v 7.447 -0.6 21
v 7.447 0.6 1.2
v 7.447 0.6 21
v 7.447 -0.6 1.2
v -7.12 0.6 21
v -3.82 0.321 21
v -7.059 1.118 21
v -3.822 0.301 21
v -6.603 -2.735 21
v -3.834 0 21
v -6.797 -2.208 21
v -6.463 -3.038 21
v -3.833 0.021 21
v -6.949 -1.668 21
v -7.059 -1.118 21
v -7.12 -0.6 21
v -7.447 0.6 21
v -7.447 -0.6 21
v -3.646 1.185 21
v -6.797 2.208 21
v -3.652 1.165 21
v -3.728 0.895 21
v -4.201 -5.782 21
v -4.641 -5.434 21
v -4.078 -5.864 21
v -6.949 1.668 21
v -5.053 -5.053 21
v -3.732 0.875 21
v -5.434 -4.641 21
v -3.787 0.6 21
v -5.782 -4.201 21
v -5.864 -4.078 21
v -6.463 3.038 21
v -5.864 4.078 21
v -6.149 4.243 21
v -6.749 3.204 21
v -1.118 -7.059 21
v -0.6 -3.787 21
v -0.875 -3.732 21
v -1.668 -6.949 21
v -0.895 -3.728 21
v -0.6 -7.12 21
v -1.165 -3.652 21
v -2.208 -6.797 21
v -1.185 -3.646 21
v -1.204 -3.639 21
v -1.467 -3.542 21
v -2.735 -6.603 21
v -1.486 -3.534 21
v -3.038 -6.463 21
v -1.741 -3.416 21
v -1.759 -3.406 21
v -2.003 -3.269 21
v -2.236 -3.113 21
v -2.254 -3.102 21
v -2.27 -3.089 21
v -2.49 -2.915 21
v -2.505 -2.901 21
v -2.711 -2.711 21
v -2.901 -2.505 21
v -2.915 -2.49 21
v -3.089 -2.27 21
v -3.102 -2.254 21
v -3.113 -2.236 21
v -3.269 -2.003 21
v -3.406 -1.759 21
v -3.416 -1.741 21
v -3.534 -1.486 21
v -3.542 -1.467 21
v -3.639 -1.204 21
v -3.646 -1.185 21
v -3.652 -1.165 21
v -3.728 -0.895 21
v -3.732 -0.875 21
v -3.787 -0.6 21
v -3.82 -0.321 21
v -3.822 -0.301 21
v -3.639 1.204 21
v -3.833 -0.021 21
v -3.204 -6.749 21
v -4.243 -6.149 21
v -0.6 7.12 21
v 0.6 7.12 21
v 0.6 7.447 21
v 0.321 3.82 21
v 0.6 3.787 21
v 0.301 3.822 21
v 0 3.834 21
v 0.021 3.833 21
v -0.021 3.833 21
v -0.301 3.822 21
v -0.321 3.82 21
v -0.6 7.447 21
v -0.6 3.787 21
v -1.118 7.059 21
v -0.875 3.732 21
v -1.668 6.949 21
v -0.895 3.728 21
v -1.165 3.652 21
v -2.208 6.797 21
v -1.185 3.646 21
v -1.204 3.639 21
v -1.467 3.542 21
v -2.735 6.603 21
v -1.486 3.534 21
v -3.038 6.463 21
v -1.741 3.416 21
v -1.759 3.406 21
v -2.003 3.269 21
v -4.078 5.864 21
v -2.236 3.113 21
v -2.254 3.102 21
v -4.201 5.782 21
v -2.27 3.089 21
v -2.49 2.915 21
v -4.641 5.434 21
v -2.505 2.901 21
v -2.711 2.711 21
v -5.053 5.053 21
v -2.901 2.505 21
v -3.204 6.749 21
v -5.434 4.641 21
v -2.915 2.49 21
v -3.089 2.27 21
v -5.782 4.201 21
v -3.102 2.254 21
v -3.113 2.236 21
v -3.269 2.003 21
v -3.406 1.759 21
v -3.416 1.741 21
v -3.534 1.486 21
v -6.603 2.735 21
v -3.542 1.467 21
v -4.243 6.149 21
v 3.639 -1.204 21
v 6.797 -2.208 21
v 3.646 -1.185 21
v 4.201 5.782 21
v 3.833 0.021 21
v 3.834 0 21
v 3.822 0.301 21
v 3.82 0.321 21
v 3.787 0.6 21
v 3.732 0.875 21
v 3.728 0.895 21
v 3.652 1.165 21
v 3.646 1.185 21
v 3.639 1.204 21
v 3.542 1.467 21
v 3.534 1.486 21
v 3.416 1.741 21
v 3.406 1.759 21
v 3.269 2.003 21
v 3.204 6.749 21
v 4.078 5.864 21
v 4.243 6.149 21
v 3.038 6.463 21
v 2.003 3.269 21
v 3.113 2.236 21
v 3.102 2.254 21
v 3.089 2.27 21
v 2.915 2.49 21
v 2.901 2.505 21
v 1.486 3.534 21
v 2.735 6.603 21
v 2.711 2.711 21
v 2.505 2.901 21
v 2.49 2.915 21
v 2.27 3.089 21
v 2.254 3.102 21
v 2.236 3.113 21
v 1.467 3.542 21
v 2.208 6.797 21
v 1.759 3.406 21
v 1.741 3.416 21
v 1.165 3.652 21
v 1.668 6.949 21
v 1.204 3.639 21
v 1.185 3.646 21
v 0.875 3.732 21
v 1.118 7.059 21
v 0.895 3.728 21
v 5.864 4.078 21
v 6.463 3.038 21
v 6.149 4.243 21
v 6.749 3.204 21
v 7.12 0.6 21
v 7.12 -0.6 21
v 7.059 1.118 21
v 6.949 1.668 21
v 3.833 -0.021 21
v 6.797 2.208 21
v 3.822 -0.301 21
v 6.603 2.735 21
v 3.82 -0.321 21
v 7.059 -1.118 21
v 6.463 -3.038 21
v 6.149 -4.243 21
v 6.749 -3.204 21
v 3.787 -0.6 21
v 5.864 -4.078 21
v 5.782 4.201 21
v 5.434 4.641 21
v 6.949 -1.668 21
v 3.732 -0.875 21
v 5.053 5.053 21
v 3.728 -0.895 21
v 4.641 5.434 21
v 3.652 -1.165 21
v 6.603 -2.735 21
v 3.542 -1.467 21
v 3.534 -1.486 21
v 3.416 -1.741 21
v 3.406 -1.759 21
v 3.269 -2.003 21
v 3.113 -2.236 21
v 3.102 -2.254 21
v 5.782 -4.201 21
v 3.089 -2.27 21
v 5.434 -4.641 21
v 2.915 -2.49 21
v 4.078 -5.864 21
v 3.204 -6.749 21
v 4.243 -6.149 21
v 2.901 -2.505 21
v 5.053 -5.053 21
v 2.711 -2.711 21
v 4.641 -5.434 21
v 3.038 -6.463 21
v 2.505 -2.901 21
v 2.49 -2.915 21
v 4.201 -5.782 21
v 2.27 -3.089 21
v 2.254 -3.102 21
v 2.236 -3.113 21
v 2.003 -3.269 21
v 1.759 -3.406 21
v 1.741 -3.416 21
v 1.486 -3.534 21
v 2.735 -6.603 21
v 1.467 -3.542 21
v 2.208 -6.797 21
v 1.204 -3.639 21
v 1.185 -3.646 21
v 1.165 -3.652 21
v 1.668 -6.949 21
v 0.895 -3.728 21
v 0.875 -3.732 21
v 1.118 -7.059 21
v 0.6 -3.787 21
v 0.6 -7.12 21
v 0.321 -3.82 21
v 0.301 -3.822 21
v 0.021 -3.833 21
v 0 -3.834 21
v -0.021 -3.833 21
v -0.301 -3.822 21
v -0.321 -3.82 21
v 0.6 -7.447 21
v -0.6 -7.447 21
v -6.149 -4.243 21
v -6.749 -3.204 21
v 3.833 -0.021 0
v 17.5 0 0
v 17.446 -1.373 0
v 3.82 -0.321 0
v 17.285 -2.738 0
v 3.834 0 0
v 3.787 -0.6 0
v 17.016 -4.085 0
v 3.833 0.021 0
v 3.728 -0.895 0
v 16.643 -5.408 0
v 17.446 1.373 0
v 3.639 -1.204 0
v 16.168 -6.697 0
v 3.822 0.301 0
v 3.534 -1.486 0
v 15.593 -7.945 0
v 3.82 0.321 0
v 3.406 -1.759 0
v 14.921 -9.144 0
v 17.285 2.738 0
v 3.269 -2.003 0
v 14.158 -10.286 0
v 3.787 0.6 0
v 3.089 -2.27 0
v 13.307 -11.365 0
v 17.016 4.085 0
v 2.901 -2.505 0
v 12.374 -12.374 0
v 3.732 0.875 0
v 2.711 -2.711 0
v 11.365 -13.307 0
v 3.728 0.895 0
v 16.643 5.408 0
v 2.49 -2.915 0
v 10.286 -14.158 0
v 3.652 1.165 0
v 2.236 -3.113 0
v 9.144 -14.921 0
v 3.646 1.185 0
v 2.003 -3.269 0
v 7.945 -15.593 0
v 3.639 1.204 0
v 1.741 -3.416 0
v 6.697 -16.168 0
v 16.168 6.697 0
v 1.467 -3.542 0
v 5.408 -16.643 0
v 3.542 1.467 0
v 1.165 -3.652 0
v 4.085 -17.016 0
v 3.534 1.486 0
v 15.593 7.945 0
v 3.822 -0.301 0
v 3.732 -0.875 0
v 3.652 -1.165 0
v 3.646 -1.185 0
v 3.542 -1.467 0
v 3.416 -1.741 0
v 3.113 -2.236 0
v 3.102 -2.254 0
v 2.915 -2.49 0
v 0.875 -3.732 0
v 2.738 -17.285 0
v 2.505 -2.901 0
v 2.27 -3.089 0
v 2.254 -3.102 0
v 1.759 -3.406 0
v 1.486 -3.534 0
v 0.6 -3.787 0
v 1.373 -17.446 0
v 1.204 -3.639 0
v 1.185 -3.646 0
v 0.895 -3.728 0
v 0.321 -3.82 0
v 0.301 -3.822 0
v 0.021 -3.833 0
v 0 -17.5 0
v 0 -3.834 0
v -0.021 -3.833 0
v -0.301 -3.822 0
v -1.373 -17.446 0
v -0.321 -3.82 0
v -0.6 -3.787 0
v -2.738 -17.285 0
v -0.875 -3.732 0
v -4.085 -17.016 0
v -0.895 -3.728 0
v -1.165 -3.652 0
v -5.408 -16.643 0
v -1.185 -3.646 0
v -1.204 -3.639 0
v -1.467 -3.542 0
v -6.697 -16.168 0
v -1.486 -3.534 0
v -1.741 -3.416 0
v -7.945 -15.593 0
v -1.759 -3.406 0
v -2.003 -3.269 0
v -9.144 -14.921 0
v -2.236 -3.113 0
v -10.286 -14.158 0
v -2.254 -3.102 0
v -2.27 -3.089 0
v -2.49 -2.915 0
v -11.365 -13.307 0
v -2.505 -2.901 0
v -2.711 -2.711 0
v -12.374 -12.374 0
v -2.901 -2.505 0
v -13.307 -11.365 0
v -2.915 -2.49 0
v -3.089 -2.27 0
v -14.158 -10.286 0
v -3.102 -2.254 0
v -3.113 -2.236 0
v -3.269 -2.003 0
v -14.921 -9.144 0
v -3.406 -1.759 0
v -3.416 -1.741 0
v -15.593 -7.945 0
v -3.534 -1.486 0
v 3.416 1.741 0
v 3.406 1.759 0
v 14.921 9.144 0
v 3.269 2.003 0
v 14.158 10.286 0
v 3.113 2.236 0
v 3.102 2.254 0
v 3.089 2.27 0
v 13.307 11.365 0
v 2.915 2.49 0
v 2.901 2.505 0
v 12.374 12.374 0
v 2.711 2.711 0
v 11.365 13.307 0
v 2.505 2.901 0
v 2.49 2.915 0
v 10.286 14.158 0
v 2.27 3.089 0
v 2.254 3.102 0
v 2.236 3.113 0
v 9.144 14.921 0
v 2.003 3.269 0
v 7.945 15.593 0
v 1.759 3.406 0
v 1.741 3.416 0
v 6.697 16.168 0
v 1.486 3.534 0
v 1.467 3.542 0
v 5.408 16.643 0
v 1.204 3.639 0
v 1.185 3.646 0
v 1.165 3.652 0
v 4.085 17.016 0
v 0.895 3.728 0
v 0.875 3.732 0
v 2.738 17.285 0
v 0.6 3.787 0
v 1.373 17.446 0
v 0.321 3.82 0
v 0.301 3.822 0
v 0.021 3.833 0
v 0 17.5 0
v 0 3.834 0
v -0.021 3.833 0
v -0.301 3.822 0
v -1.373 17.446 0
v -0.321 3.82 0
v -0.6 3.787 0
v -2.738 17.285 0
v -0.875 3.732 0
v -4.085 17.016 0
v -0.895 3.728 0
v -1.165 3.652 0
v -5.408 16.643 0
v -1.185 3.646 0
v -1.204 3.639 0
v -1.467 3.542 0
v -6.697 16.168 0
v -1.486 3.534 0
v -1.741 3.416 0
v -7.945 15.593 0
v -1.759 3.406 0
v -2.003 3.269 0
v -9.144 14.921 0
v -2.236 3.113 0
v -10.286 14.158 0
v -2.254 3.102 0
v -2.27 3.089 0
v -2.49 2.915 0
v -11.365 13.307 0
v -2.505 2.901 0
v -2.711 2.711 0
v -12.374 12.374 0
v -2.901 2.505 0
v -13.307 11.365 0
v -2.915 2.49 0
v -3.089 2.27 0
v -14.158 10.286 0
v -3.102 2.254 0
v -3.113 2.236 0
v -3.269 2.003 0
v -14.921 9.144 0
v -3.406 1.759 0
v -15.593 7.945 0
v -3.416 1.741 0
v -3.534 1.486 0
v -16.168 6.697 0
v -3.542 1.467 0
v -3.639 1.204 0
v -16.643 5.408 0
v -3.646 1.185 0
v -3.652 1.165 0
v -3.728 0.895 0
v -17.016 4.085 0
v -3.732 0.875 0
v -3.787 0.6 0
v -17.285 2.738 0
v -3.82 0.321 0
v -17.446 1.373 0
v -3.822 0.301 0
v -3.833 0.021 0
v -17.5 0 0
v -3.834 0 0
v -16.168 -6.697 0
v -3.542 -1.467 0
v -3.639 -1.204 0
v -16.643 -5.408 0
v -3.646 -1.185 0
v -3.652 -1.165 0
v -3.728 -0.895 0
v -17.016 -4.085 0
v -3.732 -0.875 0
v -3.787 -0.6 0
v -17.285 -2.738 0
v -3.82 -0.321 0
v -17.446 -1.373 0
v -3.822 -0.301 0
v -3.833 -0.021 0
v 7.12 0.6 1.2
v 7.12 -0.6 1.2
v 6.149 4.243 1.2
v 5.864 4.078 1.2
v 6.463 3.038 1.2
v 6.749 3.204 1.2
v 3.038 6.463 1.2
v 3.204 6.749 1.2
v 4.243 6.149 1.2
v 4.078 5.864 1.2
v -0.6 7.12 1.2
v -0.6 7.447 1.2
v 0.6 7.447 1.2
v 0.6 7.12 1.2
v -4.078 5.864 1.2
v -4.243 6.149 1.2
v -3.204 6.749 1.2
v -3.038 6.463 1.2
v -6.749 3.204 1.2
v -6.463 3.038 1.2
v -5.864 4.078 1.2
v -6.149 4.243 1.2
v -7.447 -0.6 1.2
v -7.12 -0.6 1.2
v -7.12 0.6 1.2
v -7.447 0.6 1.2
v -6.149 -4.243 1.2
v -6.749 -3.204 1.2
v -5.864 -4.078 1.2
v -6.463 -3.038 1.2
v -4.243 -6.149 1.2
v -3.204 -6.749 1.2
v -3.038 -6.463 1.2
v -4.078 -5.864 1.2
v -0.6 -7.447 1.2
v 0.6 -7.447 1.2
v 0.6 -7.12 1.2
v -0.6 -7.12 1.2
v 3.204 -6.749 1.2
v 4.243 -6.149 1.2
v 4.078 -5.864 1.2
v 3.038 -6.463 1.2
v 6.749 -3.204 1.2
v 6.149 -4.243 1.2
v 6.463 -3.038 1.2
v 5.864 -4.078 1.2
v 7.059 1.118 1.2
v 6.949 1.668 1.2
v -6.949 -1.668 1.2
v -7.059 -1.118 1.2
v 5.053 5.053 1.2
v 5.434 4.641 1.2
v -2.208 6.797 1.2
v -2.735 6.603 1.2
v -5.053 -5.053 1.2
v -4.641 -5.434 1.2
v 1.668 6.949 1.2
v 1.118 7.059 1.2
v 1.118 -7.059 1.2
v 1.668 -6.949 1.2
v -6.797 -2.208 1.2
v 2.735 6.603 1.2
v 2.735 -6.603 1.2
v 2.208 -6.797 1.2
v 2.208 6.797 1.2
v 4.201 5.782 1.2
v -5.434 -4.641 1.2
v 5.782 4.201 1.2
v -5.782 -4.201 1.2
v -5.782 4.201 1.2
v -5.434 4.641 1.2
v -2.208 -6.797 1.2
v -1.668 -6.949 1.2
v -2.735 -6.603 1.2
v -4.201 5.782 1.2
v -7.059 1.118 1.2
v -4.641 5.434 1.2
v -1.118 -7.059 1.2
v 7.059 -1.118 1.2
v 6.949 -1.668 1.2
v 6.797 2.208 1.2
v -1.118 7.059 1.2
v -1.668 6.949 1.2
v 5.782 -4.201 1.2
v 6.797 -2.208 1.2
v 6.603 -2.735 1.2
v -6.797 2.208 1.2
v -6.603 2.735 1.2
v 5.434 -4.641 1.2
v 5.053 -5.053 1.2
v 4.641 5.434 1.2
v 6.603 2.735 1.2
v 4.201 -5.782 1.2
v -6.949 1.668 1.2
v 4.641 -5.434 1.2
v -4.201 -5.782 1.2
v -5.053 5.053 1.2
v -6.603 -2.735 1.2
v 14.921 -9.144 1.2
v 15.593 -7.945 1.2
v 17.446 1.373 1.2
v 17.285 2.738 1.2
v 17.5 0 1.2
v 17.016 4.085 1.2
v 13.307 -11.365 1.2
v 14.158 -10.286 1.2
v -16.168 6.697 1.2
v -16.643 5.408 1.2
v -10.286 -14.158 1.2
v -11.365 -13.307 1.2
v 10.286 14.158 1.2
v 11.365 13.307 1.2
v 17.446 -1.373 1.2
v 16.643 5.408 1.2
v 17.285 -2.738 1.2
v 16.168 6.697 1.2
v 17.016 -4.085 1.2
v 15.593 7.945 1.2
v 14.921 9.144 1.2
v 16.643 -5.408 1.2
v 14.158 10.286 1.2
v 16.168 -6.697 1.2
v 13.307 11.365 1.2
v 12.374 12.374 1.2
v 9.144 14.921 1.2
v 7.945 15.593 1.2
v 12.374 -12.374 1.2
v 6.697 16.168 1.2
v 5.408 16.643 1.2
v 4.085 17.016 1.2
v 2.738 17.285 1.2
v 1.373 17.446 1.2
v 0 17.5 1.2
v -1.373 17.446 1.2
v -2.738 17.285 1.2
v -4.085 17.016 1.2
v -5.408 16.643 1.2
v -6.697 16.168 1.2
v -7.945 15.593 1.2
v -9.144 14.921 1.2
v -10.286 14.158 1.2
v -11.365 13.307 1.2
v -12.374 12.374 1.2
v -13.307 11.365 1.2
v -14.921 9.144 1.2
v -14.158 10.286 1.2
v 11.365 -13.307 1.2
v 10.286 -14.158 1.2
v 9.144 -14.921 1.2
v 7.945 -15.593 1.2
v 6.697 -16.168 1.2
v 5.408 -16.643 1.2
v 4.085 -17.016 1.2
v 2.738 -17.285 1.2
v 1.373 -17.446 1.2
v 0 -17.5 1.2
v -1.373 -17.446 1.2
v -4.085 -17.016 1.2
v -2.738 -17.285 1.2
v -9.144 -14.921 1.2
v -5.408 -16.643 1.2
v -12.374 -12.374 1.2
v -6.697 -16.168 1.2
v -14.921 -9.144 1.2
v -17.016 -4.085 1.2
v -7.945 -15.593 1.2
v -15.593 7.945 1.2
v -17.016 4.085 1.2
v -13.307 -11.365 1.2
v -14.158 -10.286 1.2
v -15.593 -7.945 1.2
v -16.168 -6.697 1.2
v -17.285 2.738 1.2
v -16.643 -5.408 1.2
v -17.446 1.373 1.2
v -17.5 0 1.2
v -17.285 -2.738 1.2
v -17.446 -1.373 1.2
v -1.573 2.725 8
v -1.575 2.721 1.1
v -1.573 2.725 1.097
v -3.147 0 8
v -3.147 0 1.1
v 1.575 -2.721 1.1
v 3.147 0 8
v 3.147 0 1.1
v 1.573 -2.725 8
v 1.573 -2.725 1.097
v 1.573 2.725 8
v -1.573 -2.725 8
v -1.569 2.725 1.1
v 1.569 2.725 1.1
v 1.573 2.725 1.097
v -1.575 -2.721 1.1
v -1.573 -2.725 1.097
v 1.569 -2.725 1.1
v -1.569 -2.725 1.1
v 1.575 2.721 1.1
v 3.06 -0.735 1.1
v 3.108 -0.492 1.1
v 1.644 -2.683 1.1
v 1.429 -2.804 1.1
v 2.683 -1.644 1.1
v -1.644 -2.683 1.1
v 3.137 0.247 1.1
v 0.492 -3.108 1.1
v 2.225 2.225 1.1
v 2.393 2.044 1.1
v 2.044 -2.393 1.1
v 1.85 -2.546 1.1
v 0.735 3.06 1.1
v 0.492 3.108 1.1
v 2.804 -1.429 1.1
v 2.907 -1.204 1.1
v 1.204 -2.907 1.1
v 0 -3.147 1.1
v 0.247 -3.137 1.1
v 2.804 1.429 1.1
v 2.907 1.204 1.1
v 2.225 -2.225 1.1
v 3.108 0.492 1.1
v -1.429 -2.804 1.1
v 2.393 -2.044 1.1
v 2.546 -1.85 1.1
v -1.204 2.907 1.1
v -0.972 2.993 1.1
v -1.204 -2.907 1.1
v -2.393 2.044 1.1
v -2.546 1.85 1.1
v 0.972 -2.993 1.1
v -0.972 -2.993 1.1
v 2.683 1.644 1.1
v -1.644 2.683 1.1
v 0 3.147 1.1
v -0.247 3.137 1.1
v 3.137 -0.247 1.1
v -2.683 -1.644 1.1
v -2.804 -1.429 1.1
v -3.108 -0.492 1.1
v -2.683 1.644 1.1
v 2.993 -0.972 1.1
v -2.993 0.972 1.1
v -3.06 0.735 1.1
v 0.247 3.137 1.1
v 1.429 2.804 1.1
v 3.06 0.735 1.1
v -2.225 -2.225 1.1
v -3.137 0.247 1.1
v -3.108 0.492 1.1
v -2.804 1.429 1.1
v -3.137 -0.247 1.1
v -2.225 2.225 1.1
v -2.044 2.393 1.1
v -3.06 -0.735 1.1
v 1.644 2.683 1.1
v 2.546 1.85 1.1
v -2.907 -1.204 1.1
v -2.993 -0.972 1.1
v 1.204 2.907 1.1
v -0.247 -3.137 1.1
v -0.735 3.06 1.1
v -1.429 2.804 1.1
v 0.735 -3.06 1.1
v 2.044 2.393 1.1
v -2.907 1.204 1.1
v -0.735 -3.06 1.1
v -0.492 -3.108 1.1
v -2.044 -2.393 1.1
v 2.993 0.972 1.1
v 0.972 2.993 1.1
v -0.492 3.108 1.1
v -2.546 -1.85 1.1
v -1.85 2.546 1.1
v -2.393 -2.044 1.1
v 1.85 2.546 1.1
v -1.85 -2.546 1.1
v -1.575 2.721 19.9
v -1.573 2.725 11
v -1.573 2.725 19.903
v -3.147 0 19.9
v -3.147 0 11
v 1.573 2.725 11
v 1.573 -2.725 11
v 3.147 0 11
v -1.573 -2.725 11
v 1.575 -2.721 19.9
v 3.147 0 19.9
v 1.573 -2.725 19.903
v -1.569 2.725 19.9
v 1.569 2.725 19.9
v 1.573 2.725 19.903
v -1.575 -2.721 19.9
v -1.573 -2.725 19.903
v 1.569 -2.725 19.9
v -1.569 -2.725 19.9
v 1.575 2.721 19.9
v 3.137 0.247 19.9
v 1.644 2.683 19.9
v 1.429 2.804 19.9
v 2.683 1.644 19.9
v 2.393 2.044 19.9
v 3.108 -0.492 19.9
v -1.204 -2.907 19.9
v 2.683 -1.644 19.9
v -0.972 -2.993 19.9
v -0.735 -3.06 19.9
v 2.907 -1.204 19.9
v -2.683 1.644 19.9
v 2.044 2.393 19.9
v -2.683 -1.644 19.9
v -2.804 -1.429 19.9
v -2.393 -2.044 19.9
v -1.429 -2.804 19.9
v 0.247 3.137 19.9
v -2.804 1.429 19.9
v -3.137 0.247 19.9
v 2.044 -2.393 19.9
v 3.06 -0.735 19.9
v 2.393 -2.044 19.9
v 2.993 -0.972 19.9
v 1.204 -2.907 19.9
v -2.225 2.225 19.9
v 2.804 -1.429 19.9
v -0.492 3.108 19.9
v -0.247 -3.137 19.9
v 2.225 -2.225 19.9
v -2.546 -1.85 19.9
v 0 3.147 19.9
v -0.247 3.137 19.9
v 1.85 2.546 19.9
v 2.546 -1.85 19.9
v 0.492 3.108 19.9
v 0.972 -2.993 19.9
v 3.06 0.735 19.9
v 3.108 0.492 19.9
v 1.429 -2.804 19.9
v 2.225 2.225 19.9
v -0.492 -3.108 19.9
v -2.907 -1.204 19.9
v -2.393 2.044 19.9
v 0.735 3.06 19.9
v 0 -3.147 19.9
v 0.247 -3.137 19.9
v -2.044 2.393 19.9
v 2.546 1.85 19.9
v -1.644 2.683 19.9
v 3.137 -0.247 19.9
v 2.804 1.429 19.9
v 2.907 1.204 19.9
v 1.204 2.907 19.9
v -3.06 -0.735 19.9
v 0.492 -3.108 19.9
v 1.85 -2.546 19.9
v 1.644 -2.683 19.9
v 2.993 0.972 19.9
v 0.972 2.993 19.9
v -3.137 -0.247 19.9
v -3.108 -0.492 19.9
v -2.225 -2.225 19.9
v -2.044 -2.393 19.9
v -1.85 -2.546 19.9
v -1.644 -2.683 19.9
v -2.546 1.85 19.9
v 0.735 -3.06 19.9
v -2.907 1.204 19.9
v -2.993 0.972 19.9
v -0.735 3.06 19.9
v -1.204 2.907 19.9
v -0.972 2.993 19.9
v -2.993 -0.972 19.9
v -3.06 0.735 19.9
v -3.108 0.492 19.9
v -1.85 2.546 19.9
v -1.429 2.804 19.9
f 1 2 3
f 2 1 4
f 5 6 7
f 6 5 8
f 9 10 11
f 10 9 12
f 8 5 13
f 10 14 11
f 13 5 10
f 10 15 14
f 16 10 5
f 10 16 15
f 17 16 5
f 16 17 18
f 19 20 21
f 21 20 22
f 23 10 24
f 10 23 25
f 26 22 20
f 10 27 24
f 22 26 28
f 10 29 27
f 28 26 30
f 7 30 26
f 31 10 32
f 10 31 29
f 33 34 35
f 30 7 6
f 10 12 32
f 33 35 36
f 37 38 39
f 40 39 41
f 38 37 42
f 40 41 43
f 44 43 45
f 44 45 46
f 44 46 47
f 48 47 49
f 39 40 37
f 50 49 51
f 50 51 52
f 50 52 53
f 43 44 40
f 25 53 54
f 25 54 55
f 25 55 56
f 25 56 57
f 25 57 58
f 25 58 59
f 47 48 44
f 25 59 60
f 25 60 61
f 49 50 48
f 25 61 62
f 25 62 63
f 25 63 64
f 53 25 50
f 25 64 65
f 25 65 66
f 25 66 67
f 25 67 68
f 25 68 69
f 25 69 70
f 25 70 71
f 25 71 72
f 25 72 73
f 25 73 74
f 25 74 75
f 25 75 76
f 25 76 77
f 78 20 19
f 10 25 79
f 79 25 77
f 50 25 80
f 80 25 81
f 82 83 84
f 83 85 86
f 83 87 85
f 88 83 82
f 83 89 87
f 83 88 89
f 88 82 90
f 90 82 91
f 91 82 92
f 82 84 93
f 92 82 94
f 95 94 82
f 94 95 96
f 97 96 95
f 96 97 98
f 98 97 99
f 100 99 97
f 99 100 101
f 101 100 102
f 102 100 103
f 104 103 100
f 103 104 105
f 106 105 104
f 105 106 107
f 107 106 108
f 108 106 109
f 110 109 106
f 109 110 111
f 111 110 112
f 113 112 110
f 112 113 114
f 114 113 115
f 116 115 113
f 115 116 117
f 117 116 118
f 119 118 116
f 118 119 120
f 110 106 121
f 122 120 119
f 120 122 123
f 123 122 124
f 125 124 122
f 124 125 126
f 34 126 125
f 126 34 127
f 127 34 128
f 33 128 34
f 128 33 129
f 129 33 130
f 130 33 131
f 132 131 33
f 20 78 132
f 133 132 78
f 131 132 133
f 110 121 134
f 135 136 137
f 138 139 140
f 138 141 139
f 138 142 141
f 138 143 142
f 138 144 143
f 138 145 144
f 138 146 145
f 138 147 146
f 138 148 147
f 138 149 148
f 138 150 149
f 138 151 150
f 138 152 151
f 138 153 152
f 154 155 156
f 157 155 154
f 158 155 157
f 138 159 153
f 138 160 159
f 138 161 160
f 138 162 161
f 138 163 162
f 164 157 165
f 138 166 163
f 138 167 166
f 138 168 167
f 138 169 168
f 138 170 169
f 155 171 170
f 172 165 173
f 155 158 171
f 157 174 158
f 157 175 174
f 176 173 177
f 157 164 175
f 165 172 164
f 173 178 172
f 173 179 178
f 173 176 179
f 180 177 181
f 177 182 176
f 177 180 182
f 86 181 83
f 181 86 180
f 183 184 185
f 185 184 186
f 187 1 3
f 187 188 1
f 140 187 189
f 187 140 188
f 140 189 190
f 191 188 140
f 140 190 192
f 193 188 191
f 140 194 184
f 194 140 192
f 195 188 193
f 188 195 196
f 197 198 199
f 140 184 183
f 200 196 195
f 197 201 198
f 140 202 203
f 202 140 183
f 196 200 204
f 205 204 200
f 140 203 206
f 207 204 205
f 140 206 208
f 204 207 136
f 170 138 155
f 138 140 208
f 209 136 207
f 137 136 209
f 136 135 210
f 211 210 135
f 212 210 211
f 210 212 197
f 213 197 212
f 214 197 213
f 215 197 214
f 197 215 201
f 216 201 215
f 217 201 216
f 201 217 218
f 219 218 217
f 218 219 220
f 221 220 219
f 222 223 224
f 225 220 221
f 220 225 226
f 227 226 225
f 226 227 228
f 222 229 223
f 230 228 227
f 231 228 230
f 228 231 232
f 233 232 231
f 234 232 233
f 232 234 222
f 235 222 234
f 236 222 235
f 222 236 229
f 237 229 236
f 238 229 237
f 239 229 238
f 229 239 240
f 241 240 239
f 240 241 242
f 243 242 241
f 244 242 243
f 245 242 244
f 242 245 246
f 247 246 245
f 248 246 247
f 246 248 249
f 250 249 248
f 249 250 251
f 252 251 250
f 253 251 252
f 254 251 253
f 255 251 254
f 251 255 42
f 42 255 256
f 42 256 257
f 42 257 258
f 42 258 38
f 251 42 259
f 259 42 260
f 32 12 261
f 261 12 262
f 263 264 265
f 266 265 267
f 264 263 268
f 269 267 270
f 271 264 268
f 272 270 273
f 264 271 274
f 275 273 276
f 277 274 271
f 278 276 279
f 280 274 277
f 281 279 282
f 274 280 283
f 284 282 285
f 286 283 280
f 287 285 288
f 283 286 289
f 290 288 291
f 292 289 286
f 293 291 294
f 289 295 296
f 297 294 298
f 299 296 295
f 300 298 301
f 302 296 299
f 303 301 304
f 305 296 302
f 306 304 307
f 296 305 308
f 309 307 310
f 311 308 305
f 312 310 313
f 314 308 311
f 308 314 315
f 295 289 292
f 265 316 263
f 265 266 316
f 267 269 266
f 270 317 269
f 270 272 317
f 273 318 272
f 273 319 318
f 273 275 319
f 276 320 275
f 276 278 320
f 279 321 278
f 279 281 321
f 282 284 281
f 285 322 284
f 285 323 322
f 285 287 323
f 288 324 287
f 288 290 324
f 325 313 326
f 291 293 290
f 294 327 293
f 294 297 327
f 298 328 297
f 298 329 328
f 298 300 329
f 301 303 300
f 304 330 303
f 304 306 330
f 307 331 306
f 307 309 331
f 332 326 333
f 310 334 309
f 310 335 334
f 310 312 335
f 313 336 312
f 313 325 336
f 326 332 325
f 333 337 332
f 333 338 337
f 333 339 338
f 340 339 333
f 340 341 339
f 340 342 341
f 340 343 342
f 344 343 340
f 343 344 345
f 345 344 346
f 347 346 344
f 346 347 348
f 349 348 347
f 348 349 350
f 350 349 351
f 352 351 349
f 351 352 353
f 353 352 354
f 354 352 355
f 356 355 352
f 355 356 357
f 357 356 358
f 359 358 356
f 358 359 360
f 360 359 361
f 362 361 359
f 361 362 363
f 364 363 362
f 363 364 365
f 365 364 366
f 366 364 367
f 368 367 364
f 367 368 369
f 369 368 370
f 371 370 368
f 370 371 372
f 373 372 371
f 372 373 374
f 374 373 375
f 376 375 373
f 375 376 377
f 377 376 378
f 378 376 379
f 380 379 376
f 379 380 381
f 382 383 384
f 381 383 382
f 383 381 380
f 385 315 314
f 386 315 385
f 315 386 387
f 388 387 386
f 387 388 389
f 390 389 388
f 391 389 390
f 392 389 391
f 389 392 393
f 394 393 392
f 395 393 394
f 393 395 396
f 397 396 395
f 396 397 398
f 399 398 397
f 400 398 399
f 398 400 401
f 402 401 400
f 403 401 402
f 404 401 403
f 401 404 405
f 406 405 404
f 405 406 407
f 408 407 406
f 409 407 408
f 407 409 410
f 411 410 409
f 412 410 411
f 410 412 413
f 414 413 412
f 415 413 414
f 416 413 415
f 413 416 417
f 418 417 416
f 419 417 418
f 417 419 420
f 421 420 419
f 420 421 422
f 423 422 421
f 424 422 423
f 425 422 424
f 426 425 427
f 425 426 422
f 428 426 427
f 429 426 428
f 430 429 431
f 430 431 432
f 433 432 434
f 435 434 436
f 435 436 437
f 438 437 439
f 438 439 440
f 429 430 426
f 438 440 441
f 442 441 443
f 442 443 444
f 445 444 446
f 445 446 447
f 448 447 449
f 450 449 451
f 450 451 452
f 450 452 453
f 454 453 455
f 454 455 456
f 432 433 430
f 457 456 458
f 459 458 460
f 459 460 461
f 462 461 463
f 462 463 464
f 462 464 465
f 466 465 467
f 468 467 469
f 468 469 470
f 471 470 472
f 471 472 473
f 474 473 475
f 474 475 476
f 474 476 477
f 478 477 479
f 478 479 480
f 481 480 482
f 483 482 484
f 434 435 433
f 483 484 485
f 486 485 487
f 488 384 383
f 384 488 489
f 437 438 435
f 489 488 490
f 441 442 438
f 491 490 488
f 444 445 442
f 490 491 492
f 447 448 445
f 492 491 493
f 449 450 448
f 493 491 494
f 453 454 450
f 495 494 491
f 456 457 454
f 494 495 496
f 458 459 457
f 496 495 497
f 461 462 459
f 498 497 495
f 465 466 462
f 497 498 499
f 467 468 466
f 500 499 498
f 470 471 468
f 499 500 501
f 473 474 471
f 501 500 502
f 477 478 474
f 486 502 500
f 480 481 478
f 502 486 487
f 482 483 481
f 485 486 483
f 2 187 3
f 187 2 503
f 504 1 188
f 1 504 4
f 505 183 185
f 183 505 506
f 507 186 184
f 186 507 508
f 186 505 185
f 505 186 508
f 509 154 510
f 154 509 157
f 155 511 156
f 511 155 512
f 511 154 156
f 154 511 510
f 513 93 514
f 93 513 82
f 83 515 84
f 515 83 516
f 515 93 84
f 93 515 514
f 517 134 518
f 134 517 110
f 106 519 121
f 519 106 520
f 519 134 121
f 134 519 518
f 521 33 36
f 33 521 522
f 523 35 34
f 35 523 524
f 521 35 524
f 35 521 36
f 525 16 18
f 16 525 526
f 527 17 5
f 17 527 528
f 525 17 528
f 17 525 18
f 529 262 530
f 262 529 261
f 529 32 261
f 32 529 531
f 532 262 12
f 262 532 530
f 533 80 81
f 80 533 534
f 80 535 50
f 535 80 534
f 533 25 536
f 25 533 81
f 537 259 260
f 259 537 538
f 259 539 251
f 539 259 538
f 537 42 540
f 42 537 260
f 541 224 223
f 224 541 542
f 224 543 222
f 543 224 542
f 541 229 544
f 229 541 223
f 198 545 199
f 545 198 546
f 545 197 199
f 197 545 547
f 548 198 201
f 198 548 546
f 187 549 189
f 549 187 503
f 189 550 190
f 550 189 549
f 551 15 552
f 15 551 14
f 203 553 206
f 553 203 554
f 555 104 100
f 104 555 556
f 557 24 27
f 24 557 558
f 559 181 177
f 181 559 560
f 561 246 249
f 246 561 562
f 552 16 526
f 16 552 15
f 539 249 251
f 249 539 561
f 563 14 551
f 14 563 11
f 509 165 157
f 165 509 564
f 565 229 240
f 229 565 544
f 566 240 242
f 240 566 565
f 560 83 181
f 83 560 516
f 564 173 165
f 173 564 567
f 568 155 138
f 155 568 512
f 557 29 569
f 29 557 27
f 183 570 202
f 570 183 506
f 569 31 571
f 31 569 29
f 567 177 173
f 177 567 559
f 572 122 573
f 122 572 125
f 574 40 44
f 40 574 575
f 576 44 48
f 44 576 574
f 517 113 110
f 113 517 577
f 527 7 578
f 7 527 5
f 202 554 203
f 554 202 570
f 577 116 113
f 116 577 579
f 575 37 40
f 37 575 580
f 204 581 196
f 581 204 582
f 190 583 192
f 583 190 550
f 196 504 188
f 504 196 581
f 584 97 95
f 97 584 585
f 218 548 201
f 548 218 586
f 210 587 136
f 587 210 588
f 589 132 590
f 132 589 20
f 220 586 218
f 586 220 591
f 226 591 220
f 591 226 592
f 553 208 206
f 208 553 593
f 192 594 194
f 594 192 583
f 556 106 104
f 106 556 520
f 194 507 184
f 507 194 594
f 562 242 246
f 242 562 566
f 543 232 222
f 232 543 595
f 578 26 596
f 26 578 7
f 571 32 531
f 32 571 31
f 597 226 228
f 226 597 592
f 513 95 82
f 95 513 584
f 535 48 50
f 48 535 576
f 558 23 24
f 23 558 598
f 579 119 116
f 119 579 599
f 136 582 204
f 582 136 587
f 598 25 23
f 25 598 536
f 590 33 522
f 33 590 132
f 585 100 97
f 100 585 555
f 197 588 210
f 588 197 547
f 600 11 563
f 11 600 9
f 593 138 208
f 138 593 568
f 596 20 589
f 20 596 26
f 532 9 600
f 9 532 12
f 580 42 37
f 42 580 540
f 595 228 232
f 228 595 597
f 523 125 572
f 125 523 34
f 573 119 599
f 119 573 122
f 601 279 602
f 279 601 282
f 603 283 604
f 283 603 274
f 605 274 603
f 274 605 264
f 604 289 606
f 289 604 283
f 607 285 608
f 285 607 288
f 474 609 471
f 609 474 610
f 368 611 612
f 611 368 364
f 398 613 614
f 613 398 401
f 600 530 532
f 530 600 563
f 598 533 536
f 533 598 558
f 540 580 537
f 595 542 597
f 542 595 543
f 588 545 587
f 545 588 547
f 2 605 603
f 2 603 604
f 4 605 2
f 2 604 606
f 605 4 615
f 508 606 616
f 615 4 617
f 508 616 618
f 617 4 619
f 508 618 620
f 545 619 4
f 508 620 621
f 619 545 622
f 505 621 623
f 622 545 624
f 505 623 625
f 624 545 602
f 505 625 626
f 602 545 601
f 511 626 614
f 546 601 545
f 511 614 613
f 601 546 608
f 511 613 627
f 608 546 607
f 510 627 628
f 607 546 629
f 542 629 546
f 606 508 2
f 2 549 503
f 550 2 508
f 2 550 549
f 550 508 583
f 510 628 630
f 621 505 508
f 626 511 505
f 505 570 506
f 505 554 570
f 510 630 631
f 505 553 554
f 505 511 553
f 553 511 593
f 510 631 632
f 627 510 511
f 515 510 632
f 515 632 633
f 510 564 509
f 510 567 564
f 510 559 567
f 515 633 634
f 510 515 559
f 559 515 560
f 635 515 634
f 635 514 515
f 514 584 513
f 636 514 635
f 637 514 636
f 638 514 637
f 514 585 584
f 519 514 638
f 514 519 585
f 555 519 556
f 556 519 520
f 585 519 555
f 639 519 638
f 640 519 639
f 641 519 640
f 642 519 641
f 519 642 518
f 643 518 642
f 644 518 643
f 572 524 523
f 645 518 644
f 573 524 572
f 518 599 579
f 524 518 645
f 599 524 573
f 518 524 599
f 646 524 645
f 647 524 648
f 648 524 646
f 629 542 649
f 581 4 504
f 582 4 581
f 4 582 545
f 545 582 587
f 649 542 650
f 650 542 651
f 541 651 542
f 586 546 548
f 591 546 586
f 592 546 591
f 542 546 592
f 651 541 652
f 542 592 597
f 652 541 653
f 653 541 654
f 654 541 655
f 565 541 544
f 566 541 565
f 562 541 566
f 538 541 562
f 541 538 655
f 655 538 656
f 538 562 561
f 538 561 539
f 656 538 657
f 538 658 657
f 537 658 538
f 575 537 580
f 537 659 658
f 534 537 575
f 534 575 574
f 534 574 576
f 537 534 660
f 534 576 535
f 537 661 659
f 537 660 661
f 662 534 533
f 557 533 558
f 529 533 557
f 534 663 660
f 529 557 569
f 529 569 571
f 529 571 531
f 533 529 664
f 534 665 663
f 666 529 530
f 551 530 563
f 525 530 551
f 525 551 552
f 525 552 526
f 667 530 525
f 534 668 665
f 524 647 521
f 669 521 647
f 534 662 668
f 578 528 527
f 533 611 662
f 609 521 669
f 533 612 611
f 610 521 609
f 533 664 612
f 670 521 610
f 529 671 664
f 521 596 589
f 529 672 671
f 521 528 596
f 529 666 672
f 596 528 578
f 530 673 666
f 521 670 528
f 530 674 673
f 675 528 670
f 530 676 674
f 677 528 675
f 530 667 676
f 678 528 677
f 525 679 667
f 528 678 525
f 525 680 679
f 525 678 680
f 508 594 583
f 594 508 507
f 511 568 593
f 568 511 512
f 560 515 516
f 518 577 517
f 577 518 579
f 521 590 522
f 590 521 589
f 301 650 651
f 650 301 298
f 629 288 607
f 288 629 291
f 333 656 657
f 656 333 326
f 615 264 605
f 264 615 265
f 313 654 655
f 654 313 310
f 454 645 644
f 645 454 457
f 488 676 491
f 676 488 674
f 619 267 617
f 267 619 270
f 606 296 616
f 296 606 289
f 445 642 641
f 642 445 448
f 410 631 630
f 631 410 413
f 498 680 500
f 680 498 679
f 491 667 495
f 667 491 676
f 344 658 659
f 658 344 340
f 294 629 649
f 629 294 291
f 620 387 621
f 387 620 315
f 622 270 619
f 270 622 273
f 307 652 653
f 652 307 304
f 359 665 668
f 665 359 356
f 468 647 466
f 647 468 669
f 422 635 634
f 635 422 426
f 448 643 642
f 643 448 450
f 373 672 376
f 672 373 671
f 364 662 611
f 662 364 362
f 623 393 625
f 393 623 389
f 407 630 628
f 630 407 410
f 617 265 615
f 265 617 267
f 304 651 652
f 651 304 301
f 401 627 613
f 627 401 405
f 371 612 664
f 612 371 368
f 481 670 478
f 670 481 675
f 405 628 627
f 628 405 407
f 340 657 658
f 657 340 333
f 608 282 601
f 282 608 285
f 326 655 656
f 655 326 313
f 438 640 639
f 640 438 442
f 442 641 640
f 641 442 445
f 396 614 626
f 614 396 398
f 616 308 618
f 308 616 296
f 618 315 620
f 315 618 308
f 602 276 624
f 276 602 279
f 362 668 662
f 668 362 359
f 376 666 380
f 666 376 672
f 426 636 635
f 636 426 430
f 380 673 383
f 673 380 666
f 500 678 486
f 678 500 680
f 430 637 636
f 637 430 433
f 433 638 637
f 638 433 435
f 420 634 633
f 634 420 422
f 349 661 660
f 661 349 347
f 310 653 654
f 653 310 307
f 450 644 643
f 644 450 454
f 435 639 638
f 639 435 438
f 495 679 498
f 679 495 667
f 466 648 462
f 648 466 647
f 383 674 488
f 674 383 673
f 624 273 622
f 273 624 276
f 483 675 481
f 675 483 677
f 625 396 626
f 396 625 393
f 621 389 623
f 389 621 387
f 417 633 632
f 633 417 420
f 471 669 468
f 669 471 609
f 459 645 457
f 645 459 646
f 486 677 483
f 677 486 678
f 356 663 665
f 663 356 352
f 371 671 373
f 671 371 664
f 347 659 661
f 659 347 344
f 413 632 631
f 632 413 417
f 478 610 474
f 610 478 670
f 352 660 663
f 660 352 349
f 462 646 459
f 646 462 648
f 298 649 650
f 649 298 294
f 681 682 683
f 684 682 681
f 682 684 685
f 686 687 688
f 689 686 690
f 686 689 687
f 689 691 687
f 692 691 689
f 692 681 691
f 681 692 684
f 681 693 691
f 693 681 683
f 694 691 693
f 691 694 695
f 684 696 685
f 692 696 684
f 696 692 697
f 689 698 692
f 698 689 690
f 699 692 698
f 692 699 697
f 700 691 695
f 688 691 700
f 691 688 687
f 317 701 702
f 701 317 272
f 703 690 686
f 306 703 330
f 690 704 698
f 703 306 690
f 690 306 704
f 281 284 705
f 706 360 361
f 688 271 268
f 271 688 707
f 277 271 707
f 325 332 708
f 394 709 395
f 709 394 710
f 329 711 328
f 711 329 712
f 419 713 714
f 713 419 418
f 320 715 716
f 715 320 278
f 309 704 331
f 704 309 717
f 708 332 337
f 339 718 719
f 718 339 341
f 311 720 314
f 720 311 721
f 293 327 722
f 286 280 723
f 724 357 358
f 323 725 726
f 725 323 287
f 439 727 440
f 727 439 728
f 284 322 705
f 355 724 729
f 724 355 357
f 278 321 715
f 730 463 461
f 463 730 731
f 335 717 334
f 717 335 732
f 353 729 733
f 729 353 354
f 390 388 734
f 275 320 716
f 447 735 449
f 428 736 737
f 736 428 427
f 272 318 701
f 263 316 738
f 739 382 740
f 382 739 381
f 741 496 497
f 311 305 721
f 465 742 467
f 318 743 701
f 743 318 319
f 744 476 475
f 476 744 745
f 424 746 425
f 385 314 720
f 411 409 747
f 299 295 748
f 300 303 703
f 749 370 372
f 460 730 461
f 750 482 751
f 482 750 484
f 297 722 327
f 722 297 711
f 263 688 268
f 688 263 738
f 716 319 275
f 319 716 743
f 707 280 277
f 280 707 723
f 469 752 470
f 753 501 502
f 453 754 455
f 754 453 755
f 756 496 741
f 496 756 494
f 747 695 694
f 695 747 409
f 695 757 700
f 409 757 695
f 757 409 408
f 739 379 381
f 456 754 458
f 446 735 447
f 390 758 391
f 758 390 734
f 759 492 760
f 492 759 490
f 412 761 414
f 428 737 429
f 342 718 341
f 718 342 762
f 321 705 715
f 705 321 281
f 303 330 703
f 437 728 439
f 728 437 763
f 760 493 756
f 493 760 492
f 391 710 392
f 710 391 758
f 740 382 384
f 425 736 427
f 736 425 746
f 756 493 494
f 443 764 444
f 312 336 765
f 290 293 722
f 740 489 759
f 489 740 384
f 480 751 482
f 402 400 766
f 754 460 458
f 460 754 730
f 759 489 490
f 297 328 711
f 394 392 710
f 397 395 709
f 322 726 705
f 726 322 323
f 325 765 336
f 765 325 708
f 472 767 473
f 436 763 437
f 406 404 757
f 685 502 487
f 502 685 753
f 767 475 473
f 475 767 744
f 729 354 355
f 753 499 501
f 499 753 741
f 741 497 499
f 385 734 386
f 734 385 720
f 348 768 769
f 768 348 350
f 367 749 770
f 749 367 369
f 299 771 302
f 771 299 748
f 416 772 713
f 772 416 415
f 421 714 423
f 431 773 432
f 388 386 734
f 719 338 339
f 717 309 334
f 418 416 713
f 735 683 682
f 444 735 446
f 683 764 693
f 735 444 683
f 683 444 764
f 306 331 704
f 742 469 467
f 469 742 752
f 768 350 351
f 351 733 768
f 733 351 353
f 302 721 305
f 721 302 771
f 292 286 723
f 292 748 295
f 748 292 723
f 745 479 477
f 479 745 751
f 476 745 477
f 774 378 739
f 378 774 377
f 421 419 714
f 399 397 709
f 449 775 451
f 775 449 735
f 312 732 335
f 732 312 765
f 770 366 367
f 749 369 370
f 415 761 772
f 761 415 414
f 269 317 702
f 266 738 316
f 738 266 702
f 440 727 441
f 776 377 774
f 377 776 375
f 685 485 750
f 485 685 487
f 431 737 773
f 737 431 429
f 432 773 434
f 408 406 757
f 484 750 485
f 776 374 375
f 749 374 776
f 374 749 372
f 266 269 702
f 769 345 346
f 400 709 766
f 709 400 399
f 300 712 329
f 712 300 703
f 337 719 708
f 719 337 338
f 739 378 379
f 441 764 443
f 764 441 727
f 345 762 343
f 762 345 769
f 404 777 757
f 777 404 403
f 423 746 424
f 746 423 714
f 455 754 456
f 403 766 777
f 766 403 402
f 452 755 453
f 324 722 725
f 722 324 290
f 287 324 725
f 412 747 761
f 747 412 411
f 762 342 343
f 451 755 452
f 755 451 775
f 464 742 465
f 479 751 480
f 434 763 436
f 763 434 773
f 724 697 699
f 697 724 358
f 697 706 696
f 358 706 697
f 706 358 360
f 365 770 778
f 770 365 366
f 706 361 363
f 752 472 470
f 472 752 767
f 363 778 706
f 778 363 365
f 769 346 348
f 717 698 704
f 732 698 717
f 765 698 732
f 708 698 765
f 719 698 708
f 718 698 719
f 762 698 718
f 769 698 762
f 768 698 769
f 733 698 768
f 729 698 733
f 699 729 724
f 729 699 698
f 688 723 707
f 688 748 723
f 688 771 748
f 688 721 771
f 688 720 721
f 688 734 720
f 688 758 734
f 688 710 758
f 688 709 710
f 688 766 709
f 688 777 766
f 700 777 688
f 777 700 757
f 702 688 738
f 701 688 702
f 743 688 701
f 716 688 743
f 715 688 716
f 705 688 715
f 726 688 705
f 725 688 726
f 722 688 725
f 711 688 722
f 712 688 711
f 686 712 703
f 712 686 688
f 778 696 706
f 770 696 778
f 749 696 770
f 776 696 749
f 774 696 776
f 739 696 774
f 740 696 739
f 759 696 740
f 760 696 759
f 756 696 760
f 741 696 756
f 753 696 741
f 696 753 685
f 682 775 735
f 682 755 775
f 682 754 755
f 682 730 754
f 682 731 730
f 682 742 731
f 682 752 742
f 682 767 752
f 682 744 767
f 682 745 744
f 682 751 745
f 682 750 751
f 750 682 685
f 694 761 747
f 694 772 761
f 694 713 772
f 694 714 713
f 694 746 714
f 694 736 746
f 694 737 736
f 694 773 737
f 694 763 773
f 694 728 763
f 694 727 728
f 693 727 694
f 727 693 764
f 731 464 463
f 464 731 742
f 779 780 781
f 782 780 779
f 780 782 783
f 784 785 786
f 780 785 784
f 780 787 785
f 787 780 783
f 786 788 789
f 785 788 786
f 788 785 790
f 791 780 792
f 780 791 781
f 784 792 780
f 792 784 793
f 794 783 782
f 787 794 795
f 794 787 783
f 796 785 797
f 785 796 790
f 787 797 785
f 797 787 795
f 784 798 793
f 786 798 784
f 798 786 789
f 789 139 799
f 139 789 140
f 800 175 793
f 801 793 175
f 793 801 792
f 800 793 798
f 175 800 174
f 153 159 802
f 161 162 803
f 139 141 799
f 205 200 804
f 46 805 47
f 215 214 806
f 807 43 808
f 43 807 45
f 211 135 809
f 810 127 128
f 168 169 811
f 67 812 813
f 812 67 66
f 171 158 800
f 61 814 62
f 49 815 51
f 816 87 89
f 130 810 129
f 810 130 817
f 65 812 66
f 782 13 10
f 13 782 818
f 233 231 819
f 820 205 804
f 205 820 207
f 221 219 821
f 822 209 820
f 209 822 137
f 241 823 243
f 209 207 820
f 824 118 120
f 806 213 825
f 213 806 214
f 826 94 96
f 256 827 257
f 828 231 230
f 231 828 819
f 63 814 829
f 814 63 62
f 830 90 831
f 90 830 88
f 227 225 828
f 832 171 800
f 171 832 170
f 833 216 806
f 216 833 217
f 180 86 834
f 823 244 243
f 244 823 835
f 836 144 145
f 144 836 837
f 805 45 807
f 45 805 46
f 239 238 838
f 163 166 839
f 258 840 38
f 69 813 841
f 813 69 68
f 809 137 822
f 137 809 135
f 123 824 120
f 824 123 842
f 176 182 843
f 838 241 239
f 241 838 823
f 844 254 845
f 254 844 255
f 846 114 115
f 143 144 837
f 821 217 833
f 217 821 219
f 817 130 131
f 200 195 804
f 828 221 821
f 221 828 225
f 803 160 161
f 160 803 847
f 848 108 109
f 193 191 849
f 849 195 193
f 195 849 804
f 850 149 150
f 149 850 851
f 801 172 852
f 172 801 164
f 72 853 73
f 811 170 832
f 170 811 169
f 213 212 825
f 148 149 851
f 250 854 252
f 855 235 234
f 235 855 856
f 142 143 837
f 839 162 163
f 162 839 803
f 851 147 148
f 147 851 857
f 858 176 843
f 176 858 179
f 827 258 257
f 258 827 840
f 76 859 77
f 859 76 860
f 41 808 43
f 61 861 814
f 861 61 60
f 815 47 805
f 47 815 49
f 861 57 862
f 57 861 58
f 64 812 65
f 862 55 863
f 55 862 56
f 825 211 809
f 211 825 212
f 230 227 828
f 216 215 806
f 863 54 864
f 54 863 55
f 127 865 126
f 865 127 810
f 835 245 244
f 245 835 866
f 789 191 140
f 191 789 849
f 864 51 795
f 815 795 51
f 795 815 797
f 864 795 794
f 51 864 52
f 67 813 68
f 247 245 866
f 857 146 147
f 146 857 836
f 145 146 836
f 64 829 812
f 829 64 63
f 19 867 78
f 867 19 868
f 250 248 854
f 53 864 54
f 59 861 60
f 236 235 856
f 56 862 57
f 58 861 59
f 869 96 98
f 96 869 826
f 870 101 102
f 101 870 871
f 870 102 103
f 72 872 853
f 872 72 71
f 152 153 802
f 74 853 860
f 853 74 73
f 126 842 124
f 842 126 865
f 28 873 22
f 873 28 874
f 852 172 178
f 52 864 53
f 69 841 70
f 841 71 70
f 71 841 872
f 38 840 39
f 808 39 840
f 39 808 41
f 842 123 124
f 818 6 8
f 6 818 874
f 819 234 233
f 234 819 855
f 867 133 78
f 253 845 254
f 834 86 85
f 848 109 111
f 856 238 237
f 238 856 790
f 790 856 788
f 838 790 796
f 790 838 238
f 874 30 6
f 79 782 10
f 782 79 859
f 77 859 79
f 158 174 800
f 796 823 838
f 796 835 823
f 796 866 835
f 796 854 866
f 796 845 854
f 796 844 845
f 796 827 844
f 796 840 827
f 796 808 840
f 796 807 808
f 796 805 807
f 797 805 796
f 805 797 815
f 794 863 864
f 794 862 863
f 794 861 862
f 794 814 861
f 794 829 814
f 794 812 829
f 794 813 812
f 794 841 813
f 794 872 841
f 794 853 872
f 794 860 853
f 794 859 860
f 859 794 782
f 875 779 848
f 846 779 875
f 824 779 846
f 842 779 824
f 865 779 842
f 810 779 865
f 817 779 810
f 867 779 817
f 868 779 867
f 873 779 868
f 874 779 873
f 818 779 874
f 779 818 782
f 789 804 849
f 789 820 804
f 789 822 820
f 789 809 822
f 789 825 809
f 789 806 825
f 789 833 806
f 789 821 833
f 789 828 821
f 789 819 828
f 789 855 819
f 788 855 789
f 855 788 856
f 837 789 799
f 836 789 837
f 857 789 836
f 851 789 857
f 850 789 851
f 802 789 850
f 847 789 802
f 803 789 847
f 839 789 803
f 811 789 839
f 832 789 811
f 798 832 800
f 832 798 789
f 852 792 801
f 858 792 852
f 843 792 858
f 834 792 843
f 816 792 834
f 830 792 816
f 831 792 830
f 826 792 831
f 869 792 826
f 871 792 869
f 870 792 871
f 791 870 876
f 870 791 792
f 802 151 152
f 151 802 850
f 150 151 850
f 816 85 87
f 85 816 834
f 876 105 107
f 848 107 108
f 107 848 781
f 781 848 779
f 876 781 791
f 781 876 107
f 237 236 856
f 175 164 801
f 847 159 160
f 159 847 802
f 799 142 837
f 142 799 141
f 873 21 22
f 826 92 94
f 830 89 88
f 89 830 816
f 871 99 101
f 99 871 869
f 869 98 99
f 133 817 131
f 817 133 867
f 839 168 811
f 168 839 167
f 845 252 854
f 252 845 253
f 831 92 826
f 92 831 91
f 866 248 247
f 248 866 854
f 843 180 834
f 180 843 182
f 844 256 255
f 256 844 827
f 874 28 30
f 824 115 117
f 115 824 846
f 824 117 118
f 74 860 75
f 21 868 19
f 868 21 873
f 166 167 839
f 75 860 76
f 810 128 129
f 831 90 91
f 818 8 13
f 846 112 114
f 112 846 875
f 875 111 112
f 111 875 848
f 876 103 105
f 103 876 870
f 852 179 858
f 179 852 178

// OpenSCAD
// Timemore C5 ESP Grinder <-> Screwdriver Adapter V7
// Both ends female hex socket - no breakable shaft
// Bottom: M5 hex socket (receives grinder's M5 hex drive shaft)
// Top: M5 hex socket (receives a hex bit from screwdriver)

$fn = 80;

// === Hex dimensions ===
// Grinder shaft: M5 hex (5mm across flats)
m5_af = 5.0 + 0.45;   // across flats + print clearance
m5_depth_bottom = 8;   // grinder shaft engagement depth

// Top socket: M5 hex (5mm across flats)
m5_depth_top = 10;     // bit insertion depth

// Wall thickness between hex socket and outer wall
wall_min = 4;          // minimum wall around hex socket

// Body
body_d = m5_af / cos(30) + wall_min * 2;  // auto-sized from hex + wall
body_h = m5_depth_bottom + m5_depth_top + 3; // +3mm solid middle section

// Lid to cover grinder opening (prevent beans from spilling)
lid_d = 35;            // 3.5cm diameter
lid_h = 1.2;           // thinner lid

module hex(af, h) {
    linear_extrude(height = h)
        circle(d = af / cos(30), $fn = 6);
}

module adapter() {
    difference() {
        union() {
            // Main cylindrical body
            cylinder(d = body_d, h = body_h);

            // Knurling ridges for grip
            for (a = [0:30:330]) {
                rotate([0, 0, a])
                    translate([body_d/2 - 0.3, -0.6, 0])
                        cube([0.6, 1.2, body_h]);
            }

            // Lid disc at bottom (no support needed for printing)
            cylinder(d = lid_d, h = lid_h);
        }

        // Bottom M5 hex socket (for grinder shaft)
        translate([0, 0, -0.1])
            hex(m5_af, m5_depth_bottom + 0.1);

        // Bottom entry chamfer
        translate([0, 0, -0.1])
            cylinder(d1 = m5_af / cos(30) + 1.5, d2 = m5_af / cos(30), h = 1.2);

        // Top M5 hex socket (for screwdriver bit)
        translate([0, 0, body_h - m5_depth_top])
            hex(m5_af, m5_depth_top + 0.1);

        // Top entry chamfer
        translate([0, 0, body_h + 0.1])
            mirror([0, 0, 1])
                cylinder(d1 = m5_af / cos(30) + 1.5, d2 = m5_af / cos(30), h = 1.2);
    }
}

adapter();
